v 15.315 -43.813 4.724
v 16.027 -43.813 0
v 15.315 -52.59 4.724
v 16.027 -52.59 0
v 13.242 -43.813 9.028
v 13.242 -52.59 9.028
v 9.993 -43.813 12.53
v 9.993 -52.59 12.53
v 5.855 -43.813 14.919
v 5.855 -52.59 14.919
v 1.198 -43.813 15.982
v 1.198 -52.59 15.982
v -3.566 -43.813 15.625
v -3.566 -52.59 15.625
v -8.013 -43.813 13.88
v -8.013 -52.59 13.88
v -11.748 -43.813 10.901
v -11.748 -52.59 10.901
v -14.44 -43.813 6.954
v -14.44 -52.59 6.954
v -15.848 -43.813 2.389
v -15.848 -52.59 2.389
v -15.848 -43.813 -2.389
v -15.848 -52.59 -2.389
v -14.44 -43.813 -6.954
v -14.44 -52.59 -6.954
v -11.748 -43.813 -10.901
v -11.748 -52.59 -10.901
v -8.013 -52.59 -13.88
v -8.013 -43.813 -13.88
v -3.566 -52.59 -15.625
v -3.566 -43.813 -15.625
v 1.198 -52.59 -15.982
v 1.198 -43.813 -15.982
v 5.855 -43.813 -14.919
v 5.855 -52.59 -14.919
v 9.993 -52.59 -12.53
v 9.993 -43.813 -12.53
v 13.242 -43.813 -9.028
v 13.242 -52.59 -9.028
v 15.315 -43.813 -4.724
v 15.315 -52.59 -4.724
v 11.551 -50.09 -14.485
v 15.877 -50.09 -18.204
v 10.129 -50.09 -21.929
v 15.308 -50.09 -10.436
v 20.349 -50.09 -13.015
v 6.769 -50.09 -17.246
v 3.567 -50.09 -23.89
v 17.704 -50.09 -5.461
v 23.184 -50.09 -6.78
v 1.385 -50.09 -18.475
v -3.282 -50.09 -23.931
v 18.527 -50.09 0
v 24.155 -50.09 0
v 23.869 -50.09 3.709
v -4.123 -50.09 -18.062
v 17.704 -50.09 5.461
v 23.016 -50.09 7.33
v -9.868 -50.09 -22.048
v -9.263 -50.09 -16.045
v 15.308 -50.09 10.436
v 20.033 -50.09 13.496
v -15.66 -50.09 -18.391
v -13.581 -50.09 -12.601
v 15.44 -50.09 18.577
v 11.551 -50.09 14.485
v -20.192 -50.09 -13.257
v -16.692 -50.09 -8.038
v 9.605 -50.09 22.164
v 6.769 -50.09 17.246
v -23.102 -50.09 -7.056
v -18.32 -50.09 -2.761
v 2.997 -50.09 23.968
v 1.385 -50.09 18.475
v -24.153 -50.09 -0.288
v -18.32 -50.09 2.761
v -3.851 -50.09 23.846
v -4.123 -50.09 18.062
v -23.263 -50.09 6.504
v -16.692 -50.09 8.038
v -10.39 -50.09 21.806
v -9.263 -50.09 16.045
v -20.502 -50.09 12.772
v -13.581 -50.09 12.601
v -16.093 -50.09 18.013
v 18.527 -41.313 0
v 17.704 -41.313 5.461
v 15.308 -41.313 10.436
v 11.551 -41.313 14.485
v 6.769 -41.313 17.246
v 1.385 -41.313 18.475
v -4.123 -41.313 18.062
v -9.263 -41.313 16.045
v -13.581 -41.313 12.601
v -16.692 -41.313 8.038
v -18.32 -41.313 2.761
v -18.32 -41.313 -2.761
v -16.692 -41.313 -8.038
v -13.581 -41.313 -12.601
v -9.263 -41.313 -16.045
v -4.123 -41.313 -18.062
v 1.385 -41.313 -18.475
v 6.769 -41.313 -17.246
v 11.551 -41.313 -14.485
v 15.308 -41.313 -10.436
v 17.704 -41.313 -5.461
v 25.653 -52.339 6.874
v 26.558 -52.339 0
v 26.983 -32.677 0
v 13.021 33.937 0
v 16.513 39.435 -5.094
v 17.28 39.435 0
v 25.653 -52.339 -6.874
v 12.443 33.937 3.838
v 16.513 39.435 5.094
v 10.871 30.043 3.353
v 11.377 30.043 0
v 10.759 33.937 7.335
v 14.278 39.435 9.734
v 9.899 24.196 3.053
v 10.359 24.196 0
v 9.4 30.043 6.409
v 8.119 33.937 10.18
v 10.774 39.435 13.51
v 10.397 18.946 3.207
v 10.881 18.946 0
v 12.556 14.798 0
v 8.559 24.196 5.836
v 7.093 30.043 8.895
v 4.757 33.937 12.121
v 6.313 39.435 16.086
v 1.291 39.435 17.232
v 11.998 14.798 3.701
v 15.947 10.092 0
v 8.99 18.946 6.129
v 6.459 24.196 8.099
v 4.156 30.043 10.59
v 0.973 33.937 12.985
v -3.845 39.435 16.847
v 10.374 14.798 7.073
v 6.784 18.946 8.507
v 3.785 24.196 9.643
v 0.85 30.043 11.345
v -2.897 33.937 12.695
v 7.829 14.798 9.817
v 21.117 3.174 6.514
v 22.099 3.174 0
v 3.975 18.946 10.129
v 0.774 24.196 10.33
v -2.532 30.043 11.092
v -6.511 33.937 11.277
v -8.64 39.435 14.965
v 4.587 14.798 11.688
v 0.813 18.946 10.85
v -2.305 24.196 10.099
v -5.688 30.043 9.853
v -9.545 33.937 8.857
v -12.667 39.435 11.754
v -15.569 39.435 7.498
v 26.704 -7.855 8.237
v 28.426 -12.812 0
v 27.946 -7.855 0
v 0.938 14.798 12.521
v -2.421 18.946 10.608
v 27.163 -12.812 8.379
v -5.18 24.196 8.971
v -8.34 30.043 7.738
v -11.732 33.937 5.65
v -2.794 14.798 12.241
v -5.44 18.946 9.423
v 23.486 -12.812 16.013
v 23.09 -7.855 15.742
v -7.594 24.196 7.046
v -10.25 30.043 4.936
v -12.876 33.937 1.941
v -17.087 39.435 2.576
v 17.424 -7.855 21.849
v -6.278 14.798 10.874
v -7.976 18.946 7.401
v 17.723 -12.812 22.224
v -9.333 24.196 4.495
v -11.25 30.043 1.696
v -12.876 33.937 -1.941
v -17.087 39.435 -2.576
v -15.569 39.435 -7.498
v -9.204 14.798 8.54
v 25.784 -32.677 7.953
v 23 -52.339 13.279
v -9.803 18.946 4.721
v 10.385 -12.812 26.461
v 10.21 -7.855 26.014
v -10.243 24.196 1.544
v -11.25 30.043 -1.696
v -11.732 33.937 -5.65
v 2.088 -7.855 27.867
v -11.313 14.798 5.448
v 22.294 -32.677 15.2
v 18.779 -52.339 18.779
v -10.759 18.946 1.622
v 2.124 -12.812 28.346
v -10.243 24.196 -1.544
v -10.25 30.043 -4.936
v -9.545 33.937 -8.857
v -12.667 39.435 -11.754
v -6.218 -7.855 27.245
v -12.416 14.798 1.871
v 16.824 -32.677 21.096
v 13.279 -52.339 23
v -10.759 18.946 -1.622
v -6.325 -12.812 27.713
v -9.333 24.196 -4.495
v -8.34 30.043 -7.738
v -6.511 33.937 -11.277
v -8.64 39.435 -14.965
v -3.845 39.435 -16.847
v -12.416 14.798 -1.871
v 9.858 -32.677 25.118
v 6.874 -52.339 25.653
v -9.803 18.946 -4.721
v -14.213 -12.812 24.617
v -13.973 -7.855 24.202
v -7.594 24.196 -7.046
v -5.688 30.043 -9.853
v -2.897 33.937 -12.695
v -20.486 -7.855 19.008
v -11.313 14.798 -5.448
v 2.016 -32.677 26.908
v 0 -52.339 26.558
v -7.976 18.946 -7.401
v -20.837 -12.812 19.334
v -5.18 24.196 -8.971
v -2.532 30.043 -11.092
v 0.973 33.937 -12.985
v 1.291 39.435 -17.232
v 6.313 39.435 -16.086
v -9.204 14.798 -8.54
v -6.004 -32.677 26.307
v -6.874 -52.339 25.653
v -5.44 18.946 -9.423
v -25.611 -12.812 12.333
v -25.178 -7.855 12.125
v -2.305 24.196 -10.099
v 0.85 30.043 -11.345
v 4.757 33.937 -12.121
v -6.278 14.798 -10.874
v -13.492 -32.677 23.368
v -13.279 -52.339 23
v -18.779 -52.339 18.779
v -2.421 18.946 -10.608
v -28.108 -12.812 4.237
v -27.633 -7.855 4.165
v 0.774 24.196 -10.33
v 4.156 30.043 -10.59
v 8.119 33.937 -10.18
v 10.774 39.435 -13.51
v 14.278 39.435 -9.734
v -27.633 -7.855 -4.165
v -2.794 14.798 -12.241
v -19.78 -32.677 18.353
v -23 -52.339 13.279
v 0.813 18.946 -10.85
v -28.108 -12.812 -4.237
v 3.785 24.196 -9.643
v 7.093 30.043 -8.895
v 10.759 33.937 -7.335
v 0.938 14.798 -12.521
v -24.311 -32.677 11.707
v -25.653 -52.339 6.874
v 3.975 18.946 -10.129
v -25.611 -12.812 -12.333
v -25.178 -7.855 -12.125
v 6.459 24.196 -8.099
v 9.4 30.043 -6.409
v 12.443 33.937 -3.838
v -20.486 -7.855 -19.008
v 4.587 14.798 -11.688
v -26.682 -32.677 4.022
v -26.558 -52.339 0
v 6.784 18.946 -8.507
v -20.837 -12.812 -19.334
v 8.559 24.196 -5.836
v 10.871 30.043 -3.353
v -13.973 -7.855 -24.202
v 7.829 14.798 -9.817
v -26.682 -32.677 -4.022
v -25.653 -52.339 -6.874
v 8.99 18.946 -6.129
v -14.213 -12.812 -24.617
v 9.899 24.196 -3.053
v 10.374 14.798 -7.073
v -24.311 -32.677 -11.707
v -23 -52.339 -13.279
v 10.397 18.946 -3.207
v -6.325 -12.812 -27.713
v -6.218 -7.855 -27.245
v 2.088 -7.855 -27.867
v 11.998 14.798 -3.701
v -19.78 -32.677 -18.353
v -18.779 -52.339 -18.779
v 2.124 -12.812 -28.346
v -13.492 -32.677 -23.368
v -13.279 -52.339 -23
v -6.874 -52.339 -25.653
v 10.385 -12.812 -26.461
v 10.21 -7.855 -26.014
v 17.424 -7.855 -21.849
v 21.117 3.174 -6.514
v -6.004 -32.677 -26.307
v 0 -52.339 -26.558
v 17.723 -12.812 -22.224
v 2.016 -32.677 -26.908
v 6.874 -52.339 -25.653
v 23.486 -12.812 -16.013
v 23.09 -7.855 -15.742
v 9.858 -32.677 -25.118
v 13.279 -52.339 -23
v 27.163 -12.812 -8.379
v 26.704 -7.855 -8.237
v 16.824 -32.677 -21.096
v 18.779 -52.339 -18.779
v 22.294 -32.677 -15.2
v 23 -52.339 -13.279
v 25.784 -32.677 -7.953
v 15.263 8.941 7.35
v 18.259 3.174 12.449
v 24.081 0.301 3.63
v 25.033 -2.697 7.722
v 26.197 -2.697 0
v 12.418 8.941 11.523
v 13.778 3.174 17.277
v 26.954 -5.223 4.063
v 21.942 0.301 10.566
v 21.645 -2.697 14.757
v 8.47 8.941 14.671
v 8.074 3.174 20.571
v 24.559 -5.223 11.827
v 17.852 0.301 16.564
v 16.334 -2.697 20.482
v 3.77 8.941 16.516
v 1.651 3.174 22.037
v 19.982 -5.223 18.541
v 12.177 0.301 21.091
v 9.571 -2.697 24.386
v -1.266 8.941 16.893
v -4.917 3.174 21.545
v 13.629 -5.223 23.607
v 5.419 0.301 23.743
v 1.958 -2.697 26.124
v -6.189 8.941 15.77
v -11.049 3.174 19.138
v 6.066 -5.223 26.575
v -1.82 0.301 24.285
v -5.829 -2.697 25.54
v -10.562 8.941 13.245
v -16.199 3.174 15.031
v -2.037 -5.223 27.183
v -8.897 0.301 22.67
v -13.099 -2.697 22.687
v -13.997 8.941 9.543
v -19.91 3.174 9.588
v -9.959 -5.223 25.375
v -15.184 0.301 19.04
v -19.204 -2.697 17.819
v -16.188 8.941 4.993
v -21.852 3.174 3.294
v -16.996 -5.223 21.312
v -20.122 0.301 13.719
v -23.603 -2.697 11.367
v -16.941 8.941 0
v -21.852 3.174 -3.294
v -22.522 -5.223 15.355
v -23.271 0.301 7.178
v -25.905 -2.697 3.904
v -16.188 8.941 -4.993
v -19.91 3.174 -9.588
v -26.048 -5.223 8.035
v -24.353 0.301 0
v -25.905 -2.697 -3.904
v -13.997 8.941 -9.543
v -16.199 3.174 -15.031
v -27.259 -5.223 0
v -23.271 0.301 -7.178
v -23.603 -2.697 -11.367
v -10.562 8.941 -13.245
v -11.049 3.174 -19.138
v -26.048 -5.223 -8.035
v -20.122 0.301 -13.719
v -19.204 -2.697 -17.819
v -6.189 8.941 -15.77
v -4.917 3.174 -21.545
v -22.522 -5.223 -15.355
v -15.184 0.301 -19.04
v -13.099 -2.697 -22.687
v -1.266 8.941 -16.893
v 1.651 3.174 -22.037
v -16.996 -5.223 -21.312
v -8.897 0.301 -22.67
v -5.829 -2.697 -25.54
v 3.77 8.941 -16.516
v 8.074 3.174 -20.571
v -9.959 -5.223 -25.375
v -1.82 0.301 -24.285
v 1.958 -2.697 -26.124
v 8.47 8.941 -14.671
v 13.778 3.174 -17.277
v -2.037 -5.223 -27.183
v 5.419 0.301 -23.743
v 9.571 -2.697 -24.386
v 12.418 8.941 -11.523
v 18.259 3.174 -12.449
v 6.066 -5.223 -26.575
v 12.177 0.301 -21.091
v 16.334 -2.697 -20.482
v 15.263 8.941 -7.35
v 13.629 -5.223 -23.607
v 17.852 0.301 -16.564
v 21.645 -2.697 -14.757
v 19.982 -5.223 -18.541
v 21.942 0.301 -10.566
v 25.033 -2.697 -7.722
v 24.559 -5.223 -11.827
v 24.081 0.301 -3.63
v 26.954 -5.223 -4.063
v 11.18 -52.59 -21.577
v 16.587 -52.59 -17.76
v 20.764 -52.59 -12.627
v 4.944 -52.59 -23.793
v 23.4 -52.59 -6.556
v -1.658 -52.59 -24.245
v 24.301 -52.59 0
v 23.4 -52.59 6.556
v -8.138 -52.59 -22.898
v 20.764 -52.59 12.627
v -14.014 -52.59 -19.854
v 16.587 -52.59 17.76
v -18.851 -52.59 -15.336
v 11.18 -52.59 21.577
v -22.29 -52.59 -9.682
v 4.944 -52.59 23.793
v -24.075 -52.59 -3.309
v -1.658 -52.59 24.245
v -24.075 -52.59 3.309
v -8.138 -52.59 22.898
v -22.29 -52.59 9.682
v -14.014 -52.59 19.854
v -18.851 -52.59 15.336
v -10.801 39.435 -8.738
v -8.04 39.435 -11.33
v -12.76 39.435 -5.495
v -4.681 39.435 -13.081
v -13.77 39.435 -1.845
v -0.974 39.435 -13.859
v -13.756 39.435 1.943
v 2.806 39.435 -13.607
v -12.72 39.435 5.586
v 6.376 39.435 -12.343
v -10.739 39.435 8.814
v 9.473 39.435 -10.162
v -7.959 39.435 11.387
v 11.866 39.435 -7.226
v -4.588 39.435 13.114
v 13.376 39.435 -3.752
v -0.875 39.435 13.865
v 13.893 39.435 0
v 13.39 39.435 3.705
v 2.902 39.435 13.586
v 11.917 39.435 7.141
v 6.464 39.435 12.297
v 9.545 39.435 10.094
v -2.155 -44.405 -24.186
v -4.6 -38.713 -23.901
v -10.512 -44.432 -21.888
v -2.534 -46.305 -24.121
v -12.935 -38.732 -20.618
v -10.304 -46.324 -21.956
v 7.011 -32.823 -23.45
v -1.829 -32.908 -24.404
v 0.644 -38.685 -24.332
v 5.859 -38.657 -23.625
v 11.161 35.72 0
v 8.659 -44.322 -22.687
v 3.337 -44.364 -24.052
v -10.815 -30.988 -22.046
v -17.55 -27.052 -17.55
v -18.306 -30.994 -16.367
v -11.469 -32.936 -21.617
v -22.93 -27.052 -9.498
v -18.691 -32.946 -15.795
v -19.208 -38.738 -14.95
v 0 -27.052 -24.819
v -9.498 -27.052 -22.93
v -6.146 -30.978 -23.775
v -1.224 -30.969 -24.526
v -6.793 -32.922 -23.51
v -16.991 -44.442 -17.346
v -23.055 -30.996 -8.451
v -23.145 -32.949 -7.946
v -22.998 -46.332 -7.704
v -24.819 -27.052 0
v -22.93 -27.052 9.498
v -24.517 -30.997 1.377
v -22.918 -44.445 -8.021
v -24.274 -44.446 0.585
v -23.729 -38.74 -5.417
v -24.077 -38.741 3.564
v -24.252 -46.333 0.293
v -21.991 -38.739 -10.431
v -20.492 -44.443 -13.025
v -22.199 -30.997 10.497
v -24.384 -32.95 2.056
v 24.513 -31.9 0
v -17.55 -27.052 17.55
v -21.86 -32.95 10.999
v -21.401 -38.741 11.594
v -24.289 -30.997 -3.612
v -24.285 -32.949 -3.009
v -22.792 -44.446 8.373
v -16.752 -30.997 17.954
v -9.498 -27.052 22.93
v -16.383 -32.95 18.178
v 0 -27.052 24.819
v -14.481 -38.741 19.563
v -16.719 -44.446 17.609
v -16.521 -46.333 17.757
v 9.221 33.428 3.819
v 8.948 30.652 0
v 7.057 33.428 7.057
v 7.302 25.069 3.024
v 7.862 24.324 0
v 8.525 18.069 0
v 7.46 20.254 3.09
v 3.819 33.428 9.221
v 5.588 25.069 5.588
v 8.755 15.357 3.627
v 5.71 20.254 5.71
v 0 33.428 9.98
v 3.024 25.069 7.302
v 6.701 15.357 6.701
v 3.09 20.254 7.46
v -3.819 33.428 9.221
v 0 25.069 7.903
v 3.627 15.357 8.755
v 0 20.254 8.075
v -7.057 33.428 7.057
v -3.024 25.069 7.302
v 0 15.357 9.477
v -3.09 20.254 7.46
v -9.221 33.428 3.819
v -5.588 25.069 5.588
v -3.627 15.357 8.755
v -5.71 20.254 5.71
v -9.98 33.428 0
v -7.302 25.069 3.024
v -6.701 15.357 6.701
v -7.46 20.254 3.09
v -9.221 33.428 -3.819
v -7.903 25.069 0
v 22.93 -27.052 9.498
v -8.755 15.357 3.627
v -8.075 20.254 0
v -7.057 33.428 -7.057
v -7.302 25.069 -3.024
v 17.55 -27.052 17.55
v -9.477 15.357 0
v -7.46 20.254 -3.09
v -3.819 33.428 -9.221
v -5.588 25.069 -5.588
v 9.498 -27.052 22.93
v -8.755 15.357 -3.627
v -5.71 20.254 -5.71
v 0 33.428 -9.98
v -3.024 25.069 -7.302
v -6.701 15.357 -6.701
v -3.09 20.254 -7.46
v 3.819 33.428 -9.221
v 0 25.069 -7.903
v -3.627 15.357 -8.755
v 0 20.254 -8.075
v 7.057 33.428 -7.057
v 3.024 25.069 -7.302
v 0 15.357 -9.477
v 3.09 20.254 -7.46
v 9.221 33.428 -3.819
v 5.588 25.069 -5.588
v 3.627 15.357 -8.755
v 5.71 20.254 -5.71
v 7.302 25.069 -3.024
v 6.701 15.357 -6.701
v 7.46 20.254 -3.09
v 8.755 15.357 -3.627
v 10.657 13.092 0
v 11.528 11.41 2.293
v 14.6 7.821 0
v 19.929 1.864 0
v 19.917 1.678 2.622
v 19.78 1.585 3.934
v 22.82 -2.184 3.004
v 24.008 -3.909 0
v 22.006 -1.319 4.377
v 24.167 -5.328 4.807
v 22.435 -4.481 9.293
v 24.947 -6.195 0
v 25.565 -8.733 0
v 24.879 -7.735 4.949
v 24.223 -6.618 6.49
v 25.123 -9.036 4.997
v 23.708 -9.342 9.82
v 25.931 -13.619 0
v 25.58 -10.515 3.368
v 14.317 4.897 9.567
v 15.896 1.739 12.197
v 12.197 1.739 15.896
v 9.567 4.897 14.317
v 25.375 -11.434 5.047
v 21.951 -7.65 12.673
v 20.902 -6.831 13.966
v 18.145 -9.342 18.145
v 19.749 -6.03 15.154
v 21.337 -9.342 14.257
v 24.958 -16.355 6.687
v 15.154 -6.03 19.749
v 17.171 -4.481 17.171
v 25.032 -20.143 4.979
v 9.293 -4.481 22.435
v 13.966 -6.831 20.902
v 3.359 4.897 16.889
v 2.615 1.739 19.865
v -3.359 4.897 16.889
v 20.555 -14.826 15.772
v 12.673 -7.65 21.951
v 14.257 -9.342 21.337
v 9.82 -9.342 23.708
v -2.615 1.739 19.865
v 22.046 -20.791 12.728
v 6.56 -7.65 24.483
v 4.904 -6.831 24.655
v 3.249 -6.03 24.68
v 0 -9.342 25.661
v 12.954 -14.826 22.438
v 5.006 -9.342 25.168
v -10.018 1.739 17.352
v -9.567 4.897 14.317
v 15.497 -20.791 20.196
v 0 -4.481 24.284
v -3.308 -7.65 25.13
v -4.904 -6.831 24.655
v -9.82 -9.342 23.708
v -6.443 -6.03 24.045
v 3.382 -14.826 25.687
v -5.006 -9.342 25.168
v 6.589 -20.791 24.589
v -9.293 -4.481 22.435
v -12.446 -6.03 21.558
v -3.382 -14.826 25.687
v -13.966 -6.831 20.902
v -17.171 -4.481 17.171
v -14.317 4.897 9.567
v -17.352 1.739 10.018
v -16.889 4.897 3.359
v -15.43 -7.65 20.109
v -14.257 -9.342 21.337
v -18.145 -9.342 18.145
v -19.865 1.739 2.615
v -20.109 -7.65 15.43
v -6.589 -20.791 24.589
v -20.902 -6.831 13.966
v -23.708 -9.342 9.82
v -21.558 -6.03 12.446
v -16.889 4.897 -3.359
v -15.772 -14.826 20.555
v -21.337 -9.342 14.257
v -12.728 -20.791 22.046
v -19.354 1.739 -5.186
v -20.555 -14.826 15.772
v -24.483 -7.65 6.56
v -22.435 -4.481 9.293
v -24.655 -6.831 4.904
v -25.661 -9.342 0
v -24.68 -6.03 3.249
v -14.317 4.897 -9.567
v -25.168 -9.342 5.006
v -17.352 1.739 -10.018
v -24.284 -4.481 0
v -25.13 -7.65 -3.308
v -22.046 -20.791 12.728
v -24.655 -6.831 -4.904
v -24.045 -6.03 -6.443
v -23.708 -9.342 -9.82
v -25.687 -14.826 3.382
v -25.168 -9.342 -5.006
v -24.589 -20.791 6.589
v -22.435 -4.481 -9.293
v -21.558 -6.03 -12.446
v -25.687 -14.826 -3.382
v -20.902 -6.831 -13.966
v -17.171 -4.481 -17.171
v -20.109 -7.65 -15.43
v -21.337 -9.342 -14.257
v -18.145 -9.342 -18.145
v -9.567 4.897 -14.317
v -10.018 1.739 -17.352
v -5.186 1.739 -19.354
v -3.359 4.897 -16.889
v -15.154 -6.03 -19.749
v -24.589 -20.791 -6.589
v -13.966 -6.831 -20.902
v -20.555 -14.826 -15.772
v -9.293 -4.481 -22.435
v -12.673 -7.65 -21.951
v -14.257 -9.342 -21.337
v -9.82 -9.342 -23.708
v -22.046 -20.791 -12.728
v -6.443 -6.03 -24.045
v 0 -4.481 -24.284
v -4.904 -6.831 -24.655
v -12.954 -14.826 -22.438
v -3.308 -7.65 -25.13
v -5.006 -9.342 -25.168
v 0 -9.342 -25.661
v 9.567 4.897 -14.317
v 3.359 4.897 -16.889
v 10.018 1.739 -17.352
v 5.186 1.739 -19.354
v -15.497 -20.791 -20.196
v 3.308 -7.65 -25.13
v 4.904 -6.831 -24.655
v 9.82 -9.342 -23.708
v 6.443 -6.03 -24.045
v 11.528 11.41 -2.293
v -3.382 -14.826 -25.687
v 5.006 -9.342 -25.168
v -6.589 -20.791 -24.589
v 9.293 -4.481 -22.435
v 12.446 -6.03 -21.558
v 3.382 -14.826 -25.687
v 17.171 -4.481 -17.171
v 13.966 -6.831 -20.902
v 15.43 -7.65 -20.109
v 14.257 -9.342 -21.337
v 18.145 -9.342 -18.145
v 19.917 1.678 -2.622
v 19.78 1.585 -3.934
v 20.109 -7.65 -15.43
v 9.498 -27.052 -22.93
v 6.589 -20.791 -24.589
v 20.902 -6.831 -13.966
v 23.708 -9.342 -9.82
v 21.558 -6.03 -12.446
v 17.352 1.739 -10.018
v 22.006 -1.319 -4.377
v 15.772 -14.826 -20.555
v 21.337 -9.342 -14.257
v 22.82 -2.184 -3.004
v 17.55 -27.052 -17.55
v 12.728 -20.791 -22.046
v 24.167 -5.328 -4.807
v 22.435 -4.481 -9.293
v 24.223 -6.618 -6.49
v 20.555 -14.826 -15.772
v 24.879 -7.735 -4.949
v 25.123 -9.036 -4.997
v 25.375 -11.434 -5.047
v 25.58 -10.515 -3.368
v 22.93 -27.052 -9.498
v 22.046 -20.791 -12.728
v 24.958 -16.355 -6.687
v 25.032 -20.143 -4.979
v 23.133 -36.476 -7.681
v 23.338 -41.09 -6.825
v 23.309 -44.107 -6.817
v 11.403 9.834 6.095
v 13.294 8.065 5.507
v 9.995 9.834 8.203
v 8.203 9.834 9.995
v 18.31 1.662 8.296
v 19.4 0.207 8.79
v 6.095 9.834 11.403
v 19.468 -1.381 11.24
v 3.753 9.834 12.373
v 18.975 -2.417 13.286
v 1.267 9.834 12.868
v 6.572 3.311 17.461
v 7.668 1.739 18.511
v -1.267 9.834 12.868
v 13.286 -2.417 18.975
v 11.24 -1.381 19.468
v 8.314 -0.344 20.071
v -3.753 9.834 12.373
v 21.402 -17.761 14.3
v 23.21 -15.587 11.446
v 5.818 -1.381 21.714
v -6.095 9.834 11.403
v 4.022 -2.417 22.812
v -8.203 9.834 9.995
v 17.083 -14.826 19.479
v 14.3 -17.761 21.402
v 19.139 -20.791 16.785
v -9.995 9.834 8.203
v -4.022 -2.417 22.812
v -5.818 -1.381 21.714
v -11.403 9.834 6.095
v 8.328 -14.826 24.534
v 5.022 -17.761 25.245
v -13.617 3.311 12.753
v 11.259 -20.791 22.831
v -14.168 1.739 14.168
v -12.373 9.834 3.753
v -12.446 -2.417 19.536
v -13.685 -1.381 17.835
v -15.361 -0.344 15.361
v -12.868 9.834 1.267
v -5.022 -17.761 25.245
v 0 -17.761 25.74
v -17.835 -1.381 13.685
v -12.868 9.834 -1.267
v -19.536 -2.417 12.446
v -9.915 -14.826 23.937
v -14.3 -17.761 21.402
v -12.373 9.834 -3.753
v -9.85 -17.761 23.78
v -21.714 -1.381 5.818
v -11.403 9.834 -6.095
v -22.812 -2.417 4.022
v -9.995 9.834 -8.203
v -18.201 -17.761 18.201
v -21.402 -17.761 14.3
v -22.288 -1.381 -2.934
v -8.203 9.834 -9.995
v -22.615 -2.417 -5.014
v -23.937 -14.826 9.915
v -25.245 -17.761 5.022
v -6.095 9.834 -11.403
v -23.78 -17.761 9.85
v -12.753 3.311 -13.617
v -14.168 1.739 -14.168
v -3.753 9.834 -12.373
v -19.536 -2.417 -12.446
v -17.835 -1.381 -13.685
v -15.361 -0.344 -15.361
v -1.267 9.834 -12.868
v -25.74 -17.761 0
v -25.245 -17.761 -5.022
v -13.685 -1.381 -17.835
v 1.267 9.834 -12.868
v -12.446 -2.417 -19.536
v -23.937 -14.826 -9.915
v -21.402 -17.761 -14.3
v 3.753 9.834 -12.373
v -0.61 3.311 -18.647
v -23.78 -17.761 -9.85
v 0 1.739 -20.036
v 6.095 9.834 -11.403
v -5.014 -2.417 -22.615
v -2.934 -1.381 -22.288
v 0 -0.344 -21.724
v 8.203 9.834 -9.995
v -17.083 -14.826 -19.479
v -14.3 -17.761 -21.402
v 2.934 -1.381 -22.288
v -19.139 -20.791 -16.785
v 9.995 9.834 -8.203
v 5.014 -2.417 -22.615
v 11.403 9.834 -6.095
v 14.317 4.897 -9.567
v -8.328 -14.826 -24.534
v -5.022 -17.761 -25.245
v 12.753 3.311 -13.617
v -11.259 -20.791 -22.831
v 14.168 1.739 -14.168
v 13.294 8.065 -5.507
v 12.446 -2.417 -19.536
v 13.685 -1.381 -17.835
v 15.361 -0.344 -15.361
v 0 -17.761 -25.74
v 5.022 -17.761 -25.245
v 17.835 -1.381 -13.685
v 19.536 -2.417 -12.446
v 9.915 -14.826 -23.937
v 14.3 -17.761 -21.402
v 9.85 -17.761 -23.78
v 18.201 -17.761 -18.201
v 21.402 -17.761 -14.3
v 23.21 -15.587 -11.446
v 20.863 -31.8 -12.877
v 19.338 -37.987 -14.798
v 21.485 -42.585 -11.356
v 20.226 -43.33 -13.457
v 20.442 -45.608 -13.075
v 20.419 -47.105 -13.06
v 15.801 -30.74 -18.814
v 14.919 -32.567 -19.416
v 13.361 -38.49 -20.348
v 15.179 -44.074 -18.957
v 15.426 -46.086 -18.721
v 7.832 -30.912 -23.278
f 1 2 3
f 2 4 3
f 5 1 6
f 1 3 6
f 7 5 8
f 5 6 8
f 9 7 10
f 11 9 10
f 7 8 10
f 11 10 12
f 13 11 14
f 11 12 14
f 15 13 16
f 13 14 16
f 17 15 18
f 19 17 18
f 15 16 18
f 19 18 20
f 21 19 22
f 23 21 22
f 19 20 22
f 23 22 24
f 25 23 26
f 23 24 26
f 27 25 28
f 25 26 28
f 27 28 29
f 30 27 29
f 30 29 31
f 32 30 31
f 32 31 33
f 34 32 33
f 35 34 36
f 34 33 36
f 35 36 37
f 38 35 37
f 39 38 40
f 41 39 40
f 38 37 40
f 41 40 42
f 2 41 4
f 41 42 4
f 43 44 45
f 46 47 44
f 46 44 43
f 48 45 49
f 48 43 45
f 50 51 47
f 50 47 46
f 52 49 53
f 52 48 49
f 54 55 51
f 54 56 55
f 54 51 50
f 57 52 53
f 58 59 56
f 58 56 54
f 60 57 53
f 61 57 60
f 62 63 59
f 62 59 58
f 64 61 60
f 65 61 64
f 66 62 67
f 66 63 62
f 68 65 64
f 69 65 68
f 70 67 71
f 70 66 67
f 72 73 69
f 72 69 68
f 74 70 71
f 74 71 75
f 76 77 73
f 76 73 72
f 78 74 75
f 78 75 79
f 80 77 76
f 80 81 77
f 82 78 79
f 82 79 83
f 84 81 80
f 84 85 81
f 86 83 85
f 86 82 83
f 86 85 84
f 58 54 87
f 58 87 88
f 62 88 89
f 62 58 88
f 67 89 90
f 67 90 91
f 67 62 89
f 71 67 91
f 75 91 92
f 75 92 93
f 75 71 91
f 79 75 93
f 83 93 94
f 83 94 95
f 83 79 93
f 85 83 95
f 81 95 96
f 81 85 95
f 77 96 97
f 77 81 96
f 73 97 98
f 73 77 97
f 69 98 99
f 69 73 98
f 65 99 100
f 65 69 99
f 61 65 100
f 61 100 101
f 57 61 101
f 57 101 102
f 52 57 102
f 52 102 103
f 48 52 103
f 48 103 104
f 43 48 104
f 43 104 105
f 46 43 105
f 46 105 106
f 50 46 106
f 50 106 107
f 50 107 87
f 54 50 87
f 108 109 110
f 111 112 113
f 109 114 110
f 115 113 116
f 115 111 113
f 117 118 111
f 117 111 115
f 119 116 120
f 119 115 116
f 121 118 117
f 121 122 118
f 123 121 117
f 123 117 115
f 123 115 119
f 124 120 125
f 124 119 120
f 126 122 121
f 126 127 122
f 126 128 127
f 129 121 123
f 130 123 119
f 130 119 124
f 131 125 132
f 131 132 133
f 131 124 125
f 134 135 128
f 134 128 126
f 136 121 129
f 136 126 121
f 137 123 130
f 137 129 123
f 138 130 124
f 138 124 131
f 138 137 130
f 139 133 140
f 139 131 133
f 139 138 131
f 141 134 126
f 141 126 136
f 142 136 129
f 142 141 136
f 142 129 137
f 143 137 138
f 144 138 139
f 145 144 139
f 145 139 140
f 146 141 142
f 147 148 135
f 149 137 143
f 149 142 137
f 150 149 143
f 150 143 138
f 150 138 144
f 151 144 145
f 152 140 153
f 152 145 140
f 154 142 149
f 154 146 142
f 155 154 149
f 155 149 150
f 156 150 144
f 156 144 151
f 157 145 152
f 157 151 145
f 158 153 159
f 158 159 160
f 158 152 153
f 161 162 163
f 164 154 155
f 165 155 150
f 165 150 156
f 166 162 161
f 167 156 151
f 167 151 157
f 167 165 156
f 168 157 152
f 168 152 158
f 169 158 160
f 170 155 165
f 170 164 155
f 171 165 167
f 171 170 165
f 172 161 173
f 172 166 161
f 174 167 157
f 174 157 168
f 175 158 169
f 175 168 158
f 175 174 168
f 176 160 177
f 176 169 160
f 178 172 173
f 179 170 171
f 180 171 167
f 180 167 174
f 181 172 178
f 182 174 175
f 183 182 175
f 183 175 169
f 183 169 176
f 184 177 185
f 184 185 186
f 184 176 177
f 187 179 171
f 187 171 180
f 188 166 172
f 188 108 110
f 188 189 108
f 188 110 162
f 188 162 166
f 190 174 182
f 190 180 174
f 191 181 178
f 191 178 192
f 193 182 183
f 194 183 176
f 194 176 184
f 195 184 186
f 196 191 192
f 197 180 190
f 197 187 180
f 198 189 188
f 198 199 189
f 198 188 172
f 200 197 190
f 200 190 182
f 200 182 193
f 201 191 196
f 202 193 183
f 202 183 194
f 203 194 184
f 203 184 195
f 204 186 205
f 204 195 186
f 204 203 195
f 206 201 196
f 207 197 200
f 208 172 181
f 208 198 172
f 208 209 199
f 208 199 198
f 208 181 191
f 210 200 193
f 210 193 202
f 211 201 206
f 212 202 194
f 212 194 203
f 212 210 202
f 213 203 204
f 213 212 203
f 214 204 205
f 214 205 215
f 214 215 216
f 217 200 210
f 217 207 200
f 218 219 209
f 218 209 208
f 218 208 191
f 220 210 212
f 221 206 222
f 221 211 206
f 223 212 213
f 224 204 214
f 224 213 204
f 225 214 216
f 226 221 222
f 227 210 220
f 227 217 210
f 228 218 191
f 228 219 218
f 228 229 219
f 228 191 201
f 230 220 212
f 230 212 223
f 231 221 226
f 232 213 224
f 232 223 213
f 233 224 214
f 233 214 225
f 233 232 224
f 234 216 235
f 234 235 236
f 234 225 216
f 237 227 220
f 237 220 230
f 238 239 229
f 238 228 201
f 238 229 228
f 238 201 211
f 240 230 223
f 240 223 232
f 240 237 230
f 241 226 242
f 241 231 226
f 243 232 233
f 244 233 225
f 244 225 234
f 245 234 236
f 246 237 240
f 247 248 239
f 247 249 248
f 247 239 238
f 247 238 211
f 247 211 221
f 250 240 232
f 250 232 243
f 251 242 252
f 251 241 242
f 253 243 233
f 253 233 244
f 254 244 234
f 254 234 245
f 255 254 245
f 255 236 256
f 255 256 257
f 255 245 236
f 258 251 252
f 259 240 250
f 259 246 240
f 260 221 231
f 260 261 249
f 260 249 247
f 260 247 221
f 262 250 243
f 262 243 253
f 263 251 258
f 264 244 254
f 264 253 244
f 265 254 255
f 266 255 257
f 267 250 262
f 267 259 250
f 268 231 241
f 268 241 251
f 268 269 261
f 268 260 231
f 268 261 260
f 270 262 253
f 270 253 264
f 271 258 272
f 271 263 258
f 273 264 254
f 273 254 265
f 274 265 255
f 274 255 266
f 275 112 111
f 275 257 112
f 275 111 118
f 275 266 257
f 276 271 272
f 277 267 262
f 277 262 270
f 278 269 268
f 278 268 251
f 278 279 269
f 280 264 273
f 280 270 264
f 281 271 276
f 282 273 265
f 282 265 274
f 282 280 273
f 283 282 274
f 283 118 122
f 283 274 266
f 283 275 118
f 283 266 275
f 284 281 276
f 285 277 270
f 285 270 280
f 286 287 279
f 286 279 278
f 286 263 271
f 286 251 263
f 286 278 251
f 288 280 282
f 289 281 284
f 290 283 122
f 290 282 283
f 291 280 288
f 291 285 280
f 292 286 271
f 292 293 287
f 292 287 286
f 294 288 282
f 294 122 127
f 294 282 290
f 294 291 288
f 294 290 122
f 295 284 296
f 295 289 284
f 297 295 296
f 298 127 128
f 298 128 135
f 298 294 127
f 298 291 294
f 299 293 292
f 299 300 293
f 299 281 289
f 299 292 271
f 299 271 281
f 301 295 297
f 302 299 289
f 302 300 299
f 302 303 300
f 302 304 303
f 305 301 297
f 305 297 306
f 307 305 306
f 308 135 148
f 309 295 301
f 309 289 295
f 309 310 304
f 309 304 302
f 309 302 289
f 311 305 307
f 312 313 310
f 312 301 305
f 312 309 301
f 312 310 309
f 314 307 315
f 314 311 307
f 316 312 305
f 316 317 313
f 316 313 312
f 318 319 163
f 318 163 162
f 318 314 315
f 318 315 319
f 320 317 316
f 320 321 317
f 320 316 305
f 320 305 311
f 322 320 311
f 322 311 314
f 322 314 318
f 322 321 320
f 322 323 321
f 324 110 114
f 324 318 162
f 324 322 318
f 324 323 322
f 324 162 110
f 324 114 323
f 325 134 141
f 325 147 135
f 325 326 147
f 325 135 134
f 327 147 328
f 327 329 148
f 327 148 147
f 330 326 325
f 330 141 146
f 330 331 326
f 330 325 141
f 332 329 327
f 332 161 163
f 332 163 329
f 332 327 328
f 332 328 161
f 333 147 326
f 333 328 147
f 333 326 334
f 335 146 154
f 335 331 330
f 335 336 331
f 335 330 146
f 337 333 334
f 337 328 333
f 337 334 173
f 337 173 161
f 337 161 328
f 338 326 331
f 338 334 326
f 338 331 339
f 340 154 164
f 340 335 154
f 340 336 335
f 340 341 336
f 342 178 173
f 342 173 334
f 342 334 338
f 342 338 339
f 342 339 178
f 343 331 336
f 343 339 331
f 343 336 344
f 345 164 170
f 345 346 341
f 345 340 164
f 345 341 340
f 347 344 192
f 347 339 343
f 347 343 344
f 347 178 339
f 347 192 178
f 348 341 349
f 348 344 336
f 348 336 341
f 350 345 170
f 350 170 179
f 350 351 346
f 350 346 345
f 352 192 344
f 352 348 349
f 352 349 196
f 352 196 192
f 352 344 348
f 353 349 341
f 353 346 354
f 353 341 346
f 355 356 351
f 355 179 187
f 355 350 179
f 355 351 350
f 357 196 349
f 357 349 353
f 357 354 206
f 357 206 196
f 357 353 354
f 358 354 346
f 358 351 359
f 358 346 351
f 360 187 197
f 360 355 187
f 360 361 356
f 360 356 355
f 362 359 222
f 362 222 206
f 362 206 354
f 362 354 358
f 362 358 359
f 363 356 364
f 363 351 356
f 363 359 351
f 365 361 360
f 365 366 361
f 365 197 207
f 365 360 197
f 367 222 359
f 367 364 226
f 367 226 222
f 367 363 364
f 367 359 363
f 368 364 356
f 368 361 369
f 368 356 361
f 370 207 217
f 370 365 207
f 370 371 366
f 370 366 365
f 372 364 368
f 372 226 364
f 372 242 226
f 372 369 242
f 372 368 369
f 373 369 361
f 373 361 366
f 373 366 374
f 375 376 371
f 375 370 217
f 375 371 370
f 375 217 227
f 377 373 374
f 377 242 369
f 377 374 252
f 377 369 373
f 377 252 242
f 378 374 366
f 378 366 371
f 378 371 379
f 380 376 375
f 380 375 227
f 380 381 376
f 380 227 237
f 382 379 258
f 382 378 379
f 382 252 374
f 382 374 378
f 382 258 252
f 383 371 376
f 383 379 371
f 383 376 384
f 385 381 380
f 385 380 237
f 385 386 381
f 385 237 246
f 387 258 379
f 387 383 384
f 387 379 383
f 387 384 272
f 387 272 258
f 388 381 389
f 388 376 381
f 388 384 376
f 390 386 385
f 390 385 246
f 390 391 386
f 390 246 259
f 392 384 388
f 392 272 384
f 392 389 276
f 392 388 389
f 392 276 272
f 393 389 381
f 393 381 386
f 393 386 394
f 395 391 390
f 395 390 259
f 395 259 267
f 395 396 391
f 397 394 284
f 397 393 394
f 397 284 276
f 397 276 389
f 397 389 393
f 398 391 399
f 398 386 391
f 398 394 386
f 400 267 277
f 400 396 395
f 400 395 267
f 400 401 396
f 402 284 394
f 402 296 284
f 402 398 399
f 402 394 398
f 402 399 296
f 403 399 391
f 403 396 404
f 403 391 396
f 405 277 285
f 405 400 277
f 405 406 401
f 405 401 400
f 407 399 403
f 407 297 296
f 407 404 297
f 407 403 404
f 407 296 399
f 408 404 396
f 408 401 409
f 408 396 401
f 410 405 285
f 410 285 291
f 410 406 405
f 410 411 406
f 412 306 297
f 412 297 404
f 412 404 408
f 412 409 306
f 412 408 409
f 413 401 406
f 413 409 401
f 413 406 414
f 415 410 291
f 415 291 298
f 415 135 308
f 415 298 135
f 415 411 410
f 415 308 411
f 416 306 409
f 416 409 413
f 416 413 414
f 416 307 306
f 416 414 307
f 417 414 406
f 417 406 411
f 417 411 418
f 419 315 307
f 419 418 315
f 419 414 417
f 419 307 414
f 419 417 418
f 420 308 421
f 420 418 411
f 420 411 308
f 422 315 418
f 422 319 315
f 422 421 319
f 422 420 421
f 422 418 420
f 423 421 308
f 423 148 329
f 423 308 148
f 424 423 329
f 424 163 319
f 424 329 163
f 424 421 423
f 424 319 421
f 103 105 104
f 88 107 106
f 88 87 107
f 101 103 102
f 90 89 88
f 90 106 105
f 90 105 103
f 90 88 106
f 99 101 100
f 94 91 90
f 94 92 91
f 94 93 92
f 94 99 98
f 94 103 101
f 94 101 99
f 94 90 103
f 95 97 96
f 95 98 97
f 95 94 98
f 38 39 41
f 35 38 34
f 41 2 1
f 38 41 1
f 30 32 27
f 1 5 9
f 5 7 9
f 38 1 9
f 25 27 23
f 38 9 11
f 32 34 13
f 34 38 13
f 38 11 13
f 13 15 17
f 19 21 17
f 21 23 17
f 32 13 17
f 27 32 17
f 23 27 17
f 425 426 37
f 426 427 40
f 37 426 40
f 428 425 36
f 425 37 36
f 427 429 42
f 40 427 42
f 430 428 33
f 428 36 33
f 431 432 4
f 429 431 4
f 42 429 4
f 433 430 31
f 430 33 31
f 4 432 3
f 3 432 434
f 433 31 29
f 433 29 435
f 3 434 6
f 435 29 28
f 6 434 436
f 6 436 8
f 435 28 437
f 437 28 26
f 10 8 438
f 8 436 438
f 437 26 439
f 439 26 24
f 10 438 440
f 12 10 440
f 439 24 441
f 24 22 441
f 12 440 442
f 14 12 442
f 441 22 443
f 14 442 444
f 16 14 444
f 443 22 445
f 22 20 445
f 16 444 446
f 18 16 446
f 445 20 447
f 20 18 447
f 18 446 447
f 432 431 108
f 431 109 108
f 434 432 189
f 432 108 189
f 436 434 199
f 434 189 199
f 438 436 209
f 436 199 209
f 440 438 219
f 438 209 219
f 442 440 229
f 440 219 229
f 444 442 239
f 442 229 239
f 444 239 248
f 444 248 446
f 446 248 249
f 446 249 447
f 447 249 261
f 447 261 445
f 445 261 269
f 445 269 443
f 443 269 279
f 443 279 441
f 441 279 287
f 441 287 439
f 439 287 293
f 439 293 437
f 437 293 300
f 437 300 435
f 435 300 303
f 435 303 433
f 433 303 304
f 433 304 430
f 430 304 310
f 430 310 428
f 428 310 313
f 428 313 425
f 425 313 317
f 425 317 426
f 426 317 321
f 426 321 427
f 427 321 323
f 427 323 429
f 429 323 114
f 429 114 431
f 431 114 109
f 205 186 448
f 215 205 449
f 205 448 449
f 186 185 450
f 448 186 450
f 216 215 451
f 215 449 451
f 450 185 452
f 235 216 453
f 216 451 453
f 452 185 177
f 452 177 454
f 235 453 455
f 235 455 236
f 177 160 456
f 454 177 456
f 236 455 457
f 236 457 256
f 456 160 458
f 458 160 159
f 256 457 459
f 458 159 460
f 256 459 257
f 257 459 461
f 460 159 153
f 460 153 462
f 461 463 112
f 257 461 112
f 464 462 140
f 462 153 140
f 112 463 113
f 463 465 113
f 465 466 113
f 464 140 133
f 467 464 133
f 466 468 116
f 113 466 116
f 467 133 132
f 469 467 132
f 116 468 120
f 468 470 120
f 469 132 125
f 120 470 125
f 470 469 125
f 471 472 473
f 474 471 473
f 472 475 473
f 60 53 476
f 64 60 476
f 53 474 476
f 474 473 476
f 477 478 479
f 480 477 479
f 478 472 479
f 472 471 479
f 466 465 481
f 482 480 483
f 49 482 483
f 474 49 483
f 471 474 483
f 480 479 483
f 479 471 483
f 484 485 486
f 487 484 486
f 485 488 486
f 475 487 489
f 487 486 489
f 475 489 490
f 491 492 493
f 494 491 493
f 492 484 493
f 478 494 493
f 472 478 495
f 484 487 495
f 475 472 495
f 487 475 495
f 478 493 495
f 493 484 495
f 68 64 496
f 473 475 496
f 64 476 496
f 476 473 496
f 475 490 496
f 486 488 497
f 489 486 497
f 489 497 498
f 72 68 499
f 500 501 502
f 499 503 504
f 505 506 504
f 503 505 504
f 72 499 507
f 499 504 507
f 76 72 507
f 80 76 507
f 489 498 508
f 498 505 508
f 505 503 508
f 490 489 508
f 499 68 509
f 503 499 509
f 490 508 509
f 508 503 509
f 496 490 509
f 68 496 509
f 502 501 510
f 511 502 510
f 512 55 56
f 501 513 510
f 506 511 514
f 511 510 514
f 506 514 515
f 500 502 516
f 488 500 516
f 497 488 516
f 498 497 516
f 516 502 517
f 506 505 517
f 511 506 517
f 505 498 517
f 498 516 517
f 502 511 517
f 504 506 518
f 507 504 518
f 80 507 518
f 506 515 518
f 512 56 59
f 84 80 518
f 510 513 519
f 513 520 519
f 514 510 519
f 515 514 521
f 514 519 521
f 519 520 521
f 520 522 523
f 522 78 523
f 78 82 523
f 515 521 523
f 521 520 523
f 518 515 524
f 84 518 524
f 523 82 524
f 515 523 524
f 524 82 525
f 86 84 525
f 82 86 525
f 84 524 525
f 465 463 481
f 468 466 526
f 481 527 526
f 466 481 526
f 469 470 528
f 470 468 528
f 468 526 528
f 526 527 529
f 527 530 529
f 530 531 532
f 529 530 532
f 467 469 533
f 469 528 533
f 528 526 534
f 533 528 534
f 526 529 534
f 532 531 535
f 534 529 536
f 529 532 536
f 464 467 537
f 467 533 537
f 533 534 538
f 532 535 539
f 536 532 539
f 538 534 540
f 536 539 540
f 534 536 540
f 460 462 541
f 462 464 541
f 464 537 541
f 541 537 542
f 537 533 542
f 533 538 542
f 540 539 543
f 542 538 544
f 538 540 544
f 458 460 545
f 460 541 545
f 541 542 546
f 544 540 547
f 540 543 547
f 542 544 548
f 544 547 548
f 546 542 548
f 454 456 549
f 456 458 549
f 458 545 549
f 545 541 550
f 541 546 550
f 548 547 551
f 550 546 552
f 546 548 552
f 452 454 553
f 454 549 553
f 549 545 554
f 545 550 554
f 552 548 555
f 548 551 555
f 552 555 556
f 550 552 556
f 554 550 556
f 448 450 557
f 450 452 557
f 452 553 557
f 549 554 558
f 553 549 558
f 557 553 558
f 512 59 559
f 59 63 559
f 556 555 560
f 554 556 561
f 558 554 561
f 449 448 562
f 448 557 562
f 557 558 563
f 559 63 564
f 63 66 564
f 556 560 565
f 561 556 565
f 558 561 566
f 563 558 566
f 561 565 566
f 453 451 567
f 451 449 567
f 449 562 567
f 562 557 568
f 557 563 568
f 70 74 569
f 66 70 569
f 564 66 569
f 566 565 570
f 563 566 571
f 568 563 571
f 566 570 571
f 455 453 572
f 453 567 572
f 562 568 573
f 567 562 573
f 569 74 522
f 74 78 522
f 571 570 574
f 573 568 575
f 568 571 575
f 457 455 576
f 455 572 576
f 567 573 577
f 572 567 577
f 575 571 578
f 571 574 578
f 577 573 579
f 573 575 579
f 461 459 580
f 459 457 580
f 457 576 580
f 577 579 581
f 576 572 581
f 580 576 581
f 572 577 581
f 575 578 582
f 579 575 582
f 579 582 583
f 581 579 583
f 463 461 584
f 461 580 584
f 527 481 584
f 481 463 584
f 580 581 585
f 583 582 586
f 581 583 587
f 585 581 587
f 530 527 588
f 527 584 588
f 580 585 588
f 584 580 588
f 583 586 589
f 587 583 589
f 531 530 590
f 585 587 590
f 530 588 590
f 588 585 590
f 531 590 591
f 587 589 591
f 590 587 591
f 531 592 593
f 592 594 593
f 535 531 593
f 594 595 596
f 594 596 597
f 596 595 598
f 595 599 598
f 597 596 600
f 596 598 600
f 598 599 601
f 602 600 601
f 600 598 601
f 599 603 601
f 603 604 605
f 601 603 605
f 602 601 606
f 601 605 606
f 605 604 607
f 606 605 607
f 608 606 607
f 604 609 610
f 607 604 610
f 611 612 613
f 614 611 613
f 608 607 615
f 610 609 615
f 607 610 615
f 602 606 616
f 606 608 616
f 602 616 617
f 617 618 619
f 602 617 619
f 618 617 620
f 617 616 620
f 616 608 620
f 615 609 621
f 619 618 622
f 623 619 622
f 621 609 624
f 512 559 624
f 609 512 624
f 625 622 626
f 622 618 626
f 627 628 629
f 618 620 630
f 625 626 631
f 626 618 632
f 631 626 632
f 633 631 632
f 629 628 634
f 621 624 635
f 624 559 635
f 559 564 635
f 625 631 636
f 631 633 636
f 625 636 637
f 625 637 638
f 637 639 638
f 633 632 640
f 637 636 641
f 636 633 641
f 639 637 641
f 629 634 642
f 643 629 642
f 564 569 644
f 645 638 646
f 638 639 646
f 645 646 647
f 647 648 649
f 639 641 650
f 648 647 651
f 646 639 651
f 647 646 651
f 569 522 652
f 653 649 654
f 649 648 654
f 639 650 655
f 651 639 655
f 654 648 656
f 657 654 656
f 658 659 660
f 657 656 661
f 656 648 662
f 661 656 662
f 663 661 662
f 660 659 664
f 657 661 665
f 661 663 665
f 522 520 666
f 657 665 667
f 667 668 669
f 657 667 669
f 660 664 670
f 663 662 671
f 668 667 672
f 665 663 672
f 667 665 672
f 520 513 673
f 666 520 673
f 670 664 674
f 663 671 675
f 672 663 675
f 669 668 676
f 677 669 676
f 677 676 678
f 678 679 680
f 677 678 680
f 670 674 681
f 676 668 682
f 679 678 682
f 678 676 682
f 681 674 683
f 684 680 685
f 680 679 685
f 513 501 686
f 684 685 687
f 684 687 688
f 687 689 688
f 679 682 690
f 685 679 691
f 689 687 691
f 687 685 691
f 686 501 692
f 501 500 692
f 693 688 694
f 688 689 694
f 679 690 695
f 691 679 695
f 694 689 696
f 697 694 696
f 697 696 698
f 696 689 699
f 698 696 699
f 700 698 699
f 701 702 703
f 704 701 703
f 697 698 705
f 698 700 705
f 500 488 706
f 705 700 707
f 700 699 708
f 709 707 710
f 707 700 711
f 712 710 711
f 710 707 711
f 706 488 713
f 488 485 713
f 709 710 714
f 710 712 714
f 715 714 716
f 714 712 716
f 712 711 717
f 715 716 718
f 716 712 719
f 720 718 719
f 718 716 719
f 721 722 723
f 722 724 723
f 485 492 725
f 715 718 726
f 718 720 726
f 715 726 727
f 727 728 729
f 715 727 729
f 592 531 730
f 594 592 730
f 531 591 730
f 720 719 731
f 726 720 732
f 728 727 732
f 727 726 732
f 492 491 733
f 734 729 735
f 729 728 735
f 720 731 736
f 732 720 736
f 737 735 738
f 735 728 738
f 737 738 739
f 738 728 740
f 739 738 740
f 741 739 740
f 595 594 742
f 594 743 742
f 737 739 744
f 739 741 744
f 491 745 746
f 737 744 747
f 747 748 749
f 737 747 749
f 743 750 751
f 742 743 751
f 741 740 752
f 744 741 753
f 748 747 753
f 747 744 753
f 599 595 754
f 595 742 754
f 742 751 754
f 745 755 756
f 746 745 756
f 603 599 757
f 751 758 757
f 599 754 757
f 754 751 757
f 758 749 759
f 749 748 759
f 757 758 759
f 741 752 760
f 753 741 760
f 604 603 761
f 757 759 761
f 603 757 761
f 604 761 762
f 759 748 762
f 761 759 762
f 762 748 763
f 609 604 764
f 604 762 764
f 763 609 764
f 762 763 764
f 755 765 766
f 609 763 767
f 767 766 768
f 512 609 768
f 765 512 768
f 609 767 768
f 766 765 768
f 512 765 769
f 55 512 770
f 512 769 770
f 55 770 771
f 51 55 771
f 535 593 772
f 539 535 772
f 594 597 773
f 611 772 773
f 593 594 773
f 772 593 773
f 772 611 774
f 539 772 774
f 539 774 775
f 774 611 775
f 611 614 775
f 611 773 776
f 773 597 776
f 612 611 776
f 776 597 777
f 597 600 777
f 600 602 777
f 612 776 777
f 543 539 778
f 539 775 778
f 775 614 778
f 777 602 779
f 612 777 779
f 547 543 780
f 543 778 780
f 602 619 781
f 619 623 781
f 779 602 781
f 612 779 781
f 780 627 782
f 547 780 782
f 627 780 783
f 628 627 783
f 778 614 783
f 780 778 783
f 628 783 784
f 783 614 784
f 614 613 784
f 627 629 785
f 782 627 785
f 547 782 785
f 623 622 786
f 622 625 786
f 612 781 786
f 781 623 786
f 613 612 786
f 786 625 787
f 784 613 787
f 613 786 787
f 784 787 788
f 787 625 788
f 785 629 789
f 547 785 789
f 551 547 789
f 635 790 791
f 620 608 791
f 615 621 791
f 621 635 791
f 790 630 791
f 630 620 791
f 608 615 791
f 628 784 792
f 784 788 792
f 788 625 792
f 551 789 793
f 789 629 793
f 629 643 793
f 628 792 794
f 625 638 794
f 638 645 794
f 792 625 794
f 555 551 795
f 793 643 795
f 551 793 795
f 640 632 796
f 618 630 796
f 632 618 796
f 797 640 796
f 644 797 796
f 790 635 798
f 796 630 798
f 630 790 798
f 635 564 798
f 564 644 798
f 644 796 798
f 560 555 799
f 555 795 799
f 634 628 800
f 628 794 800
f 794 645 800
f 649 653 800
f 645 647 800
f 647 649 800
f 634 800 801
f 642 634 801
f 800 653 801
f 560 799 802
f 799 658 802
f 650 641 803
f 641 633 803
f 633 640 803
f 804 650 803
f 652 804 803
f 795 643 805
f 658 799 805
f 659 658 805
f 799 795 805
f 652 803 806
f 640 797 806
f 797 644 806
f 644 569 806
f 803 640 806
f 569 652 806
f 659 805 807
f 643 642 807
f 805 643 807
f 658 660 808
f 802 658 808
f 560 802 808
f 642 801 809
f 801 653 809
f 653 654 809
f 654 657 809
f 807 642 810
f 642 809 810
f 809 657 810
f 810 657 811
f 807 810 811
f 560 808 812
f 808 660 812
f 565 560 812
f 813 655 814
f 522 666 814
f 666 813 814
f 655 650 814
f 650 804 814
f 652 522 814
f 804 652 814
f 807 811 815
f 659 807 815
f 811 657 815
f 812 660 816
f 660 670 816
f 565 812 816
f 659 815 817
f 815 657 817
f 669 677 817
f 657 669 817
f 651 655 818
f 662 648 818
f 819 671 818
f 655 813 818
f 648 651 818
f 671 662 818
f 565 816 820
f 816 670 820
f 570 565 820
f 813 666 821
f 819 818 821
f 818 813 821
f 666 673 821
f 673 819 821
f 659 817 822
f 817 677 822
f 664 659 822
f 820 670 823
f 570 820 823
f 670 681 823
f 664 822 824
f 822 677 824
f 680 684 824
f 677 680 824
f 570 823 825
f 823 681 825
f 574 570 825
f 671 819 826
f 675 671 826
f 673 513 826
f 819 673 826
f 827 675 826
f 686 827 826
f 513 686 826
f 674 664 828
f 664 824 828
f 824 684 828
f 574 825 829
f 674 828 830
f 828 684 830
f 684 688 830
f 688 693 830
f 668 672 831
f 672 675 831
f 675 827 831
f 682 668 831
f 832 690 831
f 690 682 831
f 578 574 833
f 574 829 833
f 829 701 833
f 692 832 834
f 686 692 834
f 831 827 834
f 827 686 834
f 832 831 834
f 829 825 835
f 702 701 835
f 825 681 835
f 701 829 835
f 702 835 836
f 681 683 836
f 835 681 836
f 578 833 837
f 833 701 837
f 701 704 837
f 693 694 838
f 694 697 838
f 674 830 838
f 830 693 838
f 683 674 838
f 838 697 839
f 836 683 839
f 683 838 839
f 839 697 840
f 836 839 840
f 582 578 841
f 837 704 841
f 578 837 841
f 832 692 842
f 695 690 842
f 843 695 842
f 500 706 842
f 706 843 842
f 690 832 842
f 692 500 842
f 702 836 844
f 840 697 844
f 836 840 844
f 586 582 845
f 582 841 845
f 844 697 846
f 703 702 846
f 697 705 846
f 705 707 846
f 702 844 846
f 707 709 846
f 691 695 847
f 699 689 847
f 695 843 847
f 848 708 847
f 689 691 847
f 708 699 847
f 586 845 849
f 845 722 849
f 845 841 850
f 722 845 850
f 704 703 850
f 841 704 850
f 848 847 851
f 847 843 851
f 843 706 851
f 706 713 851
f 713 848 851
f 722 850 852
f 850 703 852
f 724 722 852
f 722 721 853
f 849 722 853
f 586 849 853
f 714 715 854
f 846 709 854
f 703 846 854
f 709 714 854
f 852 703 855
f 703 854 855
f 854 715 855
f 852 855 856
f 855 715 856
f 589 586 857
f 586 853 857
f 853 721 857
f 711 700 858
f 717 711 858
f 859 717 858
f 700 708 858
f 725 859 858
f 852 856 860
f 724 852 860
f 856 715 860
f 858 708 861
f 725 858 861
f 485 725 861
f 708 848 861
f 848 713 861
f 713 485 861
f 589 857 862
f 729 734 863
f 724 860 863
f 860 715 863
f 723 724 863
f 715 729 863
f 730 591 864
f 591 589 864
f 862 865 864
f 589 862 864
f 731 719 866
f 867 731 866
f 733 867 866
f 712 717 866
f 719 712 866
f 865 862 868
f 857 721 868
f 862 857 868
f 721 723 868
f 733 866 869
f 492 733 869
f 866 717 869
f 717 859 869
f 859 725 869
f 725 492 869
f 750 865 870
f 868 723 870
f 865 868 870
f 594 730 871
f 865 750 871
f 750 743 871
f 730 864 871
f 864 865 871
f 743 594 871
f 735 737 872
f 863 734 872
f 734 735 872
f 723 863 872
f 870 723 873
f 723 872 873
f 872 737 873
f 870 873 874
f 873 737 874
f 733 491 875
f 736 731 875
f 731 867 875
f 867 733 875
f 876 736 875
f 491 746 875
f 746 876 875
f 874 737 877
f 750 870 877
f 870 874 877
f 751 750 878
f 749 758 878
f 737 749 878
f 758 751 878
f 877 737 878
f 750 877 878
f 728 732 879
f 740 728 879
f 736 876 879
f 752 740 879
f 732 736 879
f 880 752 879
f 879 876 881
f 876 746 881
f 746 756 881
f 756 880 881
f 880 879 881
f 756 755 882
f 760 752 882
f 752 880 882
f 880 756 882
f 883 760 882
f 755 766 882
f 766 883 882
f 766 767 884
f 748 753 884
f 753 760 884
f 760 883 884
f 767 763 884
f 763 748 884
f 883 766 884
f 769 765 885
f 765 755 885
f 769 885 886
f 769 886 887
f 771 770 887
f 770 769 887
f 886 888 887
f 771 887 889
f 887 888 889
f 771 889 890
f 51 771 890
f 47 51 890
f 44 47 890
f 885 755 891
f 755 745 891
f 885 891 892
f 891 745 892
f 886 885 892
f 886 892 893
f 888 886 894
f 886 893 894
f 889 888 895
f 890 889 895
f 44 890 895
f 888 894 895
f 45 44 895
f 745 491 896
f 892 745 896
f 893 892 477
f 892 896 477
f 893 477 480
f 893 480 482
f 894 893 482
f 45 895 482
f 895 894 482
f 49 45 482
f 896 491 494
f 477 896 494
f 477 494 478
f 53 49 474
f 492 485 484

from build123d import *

# Parameters (mm, degrees)
F2_T = 2.5


# Not quite as in the source:
# - a shell that OpenCascade refuses in one call is made with other operations: the cavity is built on its own and cut out


with BuildPart() as f1:
    # F0 (on Top) → F1 (revolve)
    with BuildSketch(Plane.XY):
        with BuildLine():
            Line((17.2804780304, 39.4352339208), (0, 39.4352339208))
            Line((0, 39.4352339208), (0, -43.8134409487))
            Line((0, -43.8134409487), (16.0267315805, -43.8134409487))
            Line((16.0267315805, -43.8134409487), (16.0267315805, -52.5896549225))
            Line((16.0267315805, -52.5896549225), (24.3014525622, -52.5896549225))
            Line((24.3014525622, -52.5896549225), (26.5581905842, -52.3389056325))
            add(Edge.make_bspline(
                [(17.2804780304, 39.4352339208), (15.4241225487, 37.4611710574), (11.1918862105, 32.8213707524), (7.9742124467, 14.100491533), (31.589105581, -1.866812475), (26.1954888157, -27.7072783001), (26.9938640556, -43.9876284398), (26.5581905842, -52.3389056325)],
                knots=[0, 0, 0, 0, 0.1346971319, 0.3184425297, 0.5464554161, 0.7703226354, 1, 1, 1, 1], degree=3))
        make_face()
    revolve(axis=Axis((0, -2.189103514, 0), (0, -1, 0)))

    # F2: shell of thickness 2.5, made by hand


with BuildPart() as f2_core1:
    # F2_t2: copy of F1
    add(f1.part)

    # the walls: a layer under each face that stays
    f2_faces = [f2_core1.faces().sort_by_distance(p)[0] for p in [
        (0, -43.8134409487, 0),
        (-16.0267315805, -48.2015479356, 0),
        (16.2009683748, -52.5896549225, -16.2009683748),
        (-25.4298215732, -52.4642802775, 0),
        (-23.9936965882, 0.7966822698, 0),
    ]]
    thicken(f2_faces, amount=-F2_T, mode=Mode.SUBTRACT)

    # F2_s3 → F2_t4 (revolve, cut)
    with BuildSketch(Plane.XY):
        Polygon((16.0017315805, -43.8384409487), (16.0267315805, -41.3134409487), (18.5267315805, -41.3134409487), (18.5267315805, -43.8134409487), align=None)
    revolve(axis=Axis((0, -43.8134409487, 0), (0, -1, 0)), mode=Mode.SUBTRACT)


with BuildPart() as f1_1:
    add(f1.part)

    # what is left inside the walls is the cavity
    f2_cavity = [f2_core1.part.solids().sort_by_distance(p)[0] for p in [
        (-11.283337, 12.053715, 0),
    ]]
    add(f2_cavity, mode=Mode.SUBTRACT)


solid = f1_1.part
